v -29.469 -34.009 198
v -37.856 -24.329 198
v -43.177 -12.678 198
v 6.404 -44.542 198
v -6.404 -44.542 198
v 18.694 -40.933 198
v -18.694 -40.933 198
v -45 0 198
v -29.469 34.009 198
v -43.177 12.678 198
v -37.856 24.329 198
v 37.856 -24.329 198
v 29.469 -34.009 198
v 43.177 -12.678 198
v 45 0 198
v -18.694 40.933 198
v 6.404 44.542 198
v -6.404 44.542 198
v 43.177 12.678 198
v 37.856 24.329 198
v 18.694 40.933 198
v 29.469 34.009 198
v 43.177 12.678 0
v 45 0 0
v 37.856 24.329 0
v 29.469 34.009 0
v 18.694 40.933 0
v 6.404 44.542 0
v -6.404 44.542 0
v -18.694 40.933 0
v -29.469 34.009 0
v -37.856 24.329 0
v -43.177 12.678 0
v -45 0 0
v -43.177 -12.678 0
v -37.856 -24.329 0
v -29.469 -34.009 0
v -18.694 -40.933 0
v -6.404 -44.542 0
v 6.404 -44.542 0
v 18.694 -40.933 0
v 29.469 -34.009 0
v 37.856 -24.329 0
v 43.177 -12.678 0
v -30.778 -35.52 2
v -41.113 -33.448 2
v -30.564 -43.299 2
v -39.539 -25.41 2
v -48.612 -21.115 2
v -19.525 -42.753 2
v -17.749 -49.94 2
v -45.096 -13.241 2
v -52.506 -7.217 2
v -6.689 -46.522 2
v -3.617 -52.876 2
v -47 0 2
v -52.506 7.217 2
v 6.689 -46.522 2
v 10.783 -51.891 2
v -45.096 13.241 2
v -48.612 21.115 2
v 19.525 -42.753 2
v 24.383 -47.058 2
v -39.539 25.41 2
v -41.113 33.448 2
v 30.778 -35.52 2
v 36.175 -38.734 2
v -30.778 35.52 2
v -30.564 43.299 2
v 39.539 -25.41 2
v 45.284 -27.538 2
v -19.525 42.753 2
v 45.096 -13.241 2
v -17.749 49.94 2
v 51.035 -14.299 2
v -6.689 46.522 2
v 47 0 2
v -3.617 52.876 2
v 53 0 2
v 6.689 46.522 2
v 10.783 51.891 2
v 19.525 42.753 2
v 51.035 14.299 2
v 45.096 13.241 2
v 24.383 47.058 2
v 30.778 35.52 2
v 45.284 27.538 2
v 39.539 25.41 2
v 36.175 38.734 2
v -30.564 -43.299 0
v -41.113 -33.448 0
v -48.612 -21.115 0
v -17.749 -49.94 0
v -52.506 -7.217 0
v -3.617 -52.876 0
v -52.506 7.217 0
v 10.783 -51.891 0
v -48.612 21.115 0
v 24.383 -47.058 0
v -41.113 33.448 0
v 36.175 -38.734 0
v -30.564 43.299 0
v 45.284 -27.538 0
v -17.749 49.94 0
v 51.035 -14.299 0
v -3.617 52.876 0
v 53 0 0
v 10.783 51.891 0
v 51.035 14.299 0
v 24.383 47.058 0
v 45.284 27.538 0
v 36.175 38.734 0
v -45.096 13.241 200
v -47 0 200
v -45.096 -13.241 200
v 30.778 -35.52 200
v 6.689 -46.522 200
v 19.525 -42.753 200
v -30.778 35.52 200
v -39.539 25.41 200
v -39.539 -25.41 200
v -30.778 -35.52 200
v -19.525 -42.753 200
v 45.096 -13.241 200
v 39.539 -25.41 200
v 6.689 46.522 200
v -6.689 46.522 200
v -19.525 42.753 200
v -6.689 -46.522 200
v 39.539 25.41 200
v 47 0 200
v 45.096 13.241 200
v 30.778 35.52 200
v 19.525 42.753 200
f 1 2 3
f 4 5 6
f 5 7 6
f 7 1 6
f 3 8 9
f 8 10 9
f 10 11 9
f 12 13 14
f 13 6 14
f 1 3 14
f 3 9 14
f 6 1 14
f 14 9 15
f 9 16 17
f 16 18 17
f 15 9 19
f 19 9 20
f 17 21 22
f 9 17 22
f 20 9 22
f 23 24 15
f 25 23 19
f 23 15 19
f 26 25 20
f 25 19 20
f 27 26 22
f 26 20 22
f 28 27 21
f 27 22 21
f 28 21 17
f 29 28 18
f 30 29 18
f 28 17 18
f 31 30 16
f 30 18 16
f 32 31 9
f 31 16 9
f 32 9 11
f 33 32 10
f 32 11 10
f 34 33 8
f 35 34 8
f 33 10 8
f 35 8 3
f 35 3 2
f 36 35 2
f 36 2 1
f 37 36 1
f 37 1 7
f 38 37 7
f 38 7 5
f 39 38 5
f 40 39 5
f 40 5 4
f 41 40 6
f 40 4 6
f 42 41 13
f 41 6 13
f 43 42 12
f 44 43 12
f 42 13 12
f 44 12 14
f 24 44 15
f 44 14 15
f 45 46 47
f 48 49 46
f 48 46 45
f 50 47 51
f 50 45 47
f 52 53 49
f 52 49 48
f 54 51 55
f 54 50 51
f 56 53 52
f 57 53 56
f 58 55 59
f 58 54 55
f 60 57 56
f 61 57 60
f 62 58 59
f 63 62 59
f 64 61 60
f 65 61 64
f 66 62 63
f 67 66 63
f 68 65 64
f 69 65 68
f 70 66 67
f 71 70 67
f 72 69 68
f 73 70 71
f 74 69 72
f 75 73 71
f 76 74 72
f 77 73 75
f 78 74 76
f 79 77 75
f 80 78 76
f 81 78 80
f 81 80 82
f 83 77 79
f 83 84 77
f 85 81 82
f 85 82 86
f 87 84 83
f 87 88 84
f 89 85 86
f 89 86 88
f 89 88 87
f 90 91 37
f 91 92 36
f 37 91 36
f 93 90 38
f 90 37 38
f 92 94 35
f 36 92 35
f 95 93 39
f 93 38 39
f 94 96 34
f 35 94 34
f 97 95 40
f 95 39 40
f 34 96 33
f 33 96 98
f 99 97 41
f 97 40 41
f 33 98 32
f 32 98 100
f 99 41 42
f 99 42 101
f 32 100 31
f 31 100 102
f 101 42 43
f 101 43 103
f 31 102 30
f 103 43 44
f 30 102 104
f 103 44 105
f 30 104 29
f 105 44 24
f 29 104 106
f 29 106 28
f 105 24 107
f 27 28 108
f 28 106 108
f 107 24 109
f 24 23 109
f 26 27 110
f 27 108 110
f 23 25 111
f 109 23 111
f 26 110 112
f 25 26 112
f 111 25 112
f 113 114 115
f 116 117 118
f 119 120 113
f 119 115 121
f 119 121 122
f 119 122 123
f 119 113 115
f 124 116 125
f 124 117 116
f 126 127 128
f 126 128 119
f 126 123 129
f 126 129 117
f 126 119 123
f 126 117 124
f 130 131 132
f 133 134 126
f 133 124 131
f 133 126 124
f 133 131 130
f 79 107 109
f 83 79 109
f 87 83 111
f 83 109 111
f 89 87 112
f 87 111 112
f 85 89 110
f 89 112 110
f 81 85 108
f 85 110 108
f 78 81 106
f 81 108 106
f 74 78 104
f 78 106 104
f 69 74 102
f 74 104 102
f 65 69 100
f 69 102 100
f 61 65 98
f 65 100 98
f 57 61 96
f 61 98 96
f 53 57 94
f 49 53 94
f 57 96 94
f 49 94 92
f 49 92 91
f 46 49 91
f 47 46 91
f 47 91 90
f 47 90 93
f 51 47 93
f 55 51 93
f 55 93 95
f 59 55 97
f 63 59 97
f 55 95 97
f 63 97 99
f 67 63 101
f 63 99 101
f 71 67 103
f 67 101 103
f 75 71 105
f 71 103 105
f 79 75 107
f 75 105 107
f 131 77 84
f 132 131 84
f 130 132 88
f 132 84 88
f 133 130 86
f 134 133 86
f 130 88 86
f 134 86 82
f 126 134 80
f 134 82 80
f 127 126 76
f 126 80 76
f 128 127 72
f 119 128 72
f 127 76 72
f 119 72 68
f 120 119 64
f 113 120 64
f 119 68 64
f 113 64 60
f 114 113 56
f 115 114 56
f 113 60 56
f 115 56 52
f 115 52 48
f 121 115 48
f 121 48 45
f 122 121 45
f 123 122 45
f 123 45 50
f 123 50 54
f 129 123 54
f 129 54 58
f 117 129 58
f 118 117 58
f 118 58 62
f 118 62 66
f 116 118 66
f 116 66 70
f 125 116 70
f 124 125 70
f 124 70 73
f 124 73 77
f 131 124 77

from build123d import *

# Parameters (mm, degrees)
F0_R     = 53
F0_R_2   = 47
F1_DEPTH = 2
F2_DEPTH = 200
F3_T     = 2


# Not quite as in the source:
# - a shell that OpenCascade refuses in one call is made with other operations: the cavity is built on its own and cut out


with BuildPart() as f1:
    # F0 (on Top) → F1 (new body)
    with BuildSketch(Plane.XY):
        Circle(F0_R)
        Circle(F0_R_2, mode=Mode.SUBTRACT)
    extrude(amount=F1_DEPTH)

    # F0 (on Top) → F2 (join)
    with BuildSketch(Plane.XY):
        Circle(F0_R_2)
    extrude(amount=F2_DEPTH)

    # F3: shell of thickness 2, made by hand


with BuildPart() as f3_core1:
    # F3_t2: copy of F1
    add(f1.part)

    # the walls: a layer under each face that stays
    f3_faces = [f3_core1.faces().sort_by_distance(p)[0] for p in [
        (-53, 0, 1),
        (-35.3333333333, -35.3333333333, 2),
        (-47, 0, 101),
        (0, 0, 200),
    ]]
    thicken(f3_faces, amount=-F3_T, mode=Mode.SUBTRACT)

    # F3_s3 → F3_t4 (revolve, cut)
    with BuildSketch(Plane.XZ):
        Polygon((47.02, 2.02), (47, 0), (45, 0), (45, 2), align=None)
    revolve(axis=Axis((0, 0, 2), (0, 0, 1)), mode=Mode.SUBTRACT)


with BuildPart() as f1_1:
    add(f1.part)

    # what is left inside the walls is the cavity
    f3_cavity = [f3_core1.part.solids().sort_by_distance(p)[0] for p in [
        (-44.98, 0, 132.666667),
    ]]
    add(f3_cavity, mode=Mode.SUBTRACT)


solid = f1_1.part
